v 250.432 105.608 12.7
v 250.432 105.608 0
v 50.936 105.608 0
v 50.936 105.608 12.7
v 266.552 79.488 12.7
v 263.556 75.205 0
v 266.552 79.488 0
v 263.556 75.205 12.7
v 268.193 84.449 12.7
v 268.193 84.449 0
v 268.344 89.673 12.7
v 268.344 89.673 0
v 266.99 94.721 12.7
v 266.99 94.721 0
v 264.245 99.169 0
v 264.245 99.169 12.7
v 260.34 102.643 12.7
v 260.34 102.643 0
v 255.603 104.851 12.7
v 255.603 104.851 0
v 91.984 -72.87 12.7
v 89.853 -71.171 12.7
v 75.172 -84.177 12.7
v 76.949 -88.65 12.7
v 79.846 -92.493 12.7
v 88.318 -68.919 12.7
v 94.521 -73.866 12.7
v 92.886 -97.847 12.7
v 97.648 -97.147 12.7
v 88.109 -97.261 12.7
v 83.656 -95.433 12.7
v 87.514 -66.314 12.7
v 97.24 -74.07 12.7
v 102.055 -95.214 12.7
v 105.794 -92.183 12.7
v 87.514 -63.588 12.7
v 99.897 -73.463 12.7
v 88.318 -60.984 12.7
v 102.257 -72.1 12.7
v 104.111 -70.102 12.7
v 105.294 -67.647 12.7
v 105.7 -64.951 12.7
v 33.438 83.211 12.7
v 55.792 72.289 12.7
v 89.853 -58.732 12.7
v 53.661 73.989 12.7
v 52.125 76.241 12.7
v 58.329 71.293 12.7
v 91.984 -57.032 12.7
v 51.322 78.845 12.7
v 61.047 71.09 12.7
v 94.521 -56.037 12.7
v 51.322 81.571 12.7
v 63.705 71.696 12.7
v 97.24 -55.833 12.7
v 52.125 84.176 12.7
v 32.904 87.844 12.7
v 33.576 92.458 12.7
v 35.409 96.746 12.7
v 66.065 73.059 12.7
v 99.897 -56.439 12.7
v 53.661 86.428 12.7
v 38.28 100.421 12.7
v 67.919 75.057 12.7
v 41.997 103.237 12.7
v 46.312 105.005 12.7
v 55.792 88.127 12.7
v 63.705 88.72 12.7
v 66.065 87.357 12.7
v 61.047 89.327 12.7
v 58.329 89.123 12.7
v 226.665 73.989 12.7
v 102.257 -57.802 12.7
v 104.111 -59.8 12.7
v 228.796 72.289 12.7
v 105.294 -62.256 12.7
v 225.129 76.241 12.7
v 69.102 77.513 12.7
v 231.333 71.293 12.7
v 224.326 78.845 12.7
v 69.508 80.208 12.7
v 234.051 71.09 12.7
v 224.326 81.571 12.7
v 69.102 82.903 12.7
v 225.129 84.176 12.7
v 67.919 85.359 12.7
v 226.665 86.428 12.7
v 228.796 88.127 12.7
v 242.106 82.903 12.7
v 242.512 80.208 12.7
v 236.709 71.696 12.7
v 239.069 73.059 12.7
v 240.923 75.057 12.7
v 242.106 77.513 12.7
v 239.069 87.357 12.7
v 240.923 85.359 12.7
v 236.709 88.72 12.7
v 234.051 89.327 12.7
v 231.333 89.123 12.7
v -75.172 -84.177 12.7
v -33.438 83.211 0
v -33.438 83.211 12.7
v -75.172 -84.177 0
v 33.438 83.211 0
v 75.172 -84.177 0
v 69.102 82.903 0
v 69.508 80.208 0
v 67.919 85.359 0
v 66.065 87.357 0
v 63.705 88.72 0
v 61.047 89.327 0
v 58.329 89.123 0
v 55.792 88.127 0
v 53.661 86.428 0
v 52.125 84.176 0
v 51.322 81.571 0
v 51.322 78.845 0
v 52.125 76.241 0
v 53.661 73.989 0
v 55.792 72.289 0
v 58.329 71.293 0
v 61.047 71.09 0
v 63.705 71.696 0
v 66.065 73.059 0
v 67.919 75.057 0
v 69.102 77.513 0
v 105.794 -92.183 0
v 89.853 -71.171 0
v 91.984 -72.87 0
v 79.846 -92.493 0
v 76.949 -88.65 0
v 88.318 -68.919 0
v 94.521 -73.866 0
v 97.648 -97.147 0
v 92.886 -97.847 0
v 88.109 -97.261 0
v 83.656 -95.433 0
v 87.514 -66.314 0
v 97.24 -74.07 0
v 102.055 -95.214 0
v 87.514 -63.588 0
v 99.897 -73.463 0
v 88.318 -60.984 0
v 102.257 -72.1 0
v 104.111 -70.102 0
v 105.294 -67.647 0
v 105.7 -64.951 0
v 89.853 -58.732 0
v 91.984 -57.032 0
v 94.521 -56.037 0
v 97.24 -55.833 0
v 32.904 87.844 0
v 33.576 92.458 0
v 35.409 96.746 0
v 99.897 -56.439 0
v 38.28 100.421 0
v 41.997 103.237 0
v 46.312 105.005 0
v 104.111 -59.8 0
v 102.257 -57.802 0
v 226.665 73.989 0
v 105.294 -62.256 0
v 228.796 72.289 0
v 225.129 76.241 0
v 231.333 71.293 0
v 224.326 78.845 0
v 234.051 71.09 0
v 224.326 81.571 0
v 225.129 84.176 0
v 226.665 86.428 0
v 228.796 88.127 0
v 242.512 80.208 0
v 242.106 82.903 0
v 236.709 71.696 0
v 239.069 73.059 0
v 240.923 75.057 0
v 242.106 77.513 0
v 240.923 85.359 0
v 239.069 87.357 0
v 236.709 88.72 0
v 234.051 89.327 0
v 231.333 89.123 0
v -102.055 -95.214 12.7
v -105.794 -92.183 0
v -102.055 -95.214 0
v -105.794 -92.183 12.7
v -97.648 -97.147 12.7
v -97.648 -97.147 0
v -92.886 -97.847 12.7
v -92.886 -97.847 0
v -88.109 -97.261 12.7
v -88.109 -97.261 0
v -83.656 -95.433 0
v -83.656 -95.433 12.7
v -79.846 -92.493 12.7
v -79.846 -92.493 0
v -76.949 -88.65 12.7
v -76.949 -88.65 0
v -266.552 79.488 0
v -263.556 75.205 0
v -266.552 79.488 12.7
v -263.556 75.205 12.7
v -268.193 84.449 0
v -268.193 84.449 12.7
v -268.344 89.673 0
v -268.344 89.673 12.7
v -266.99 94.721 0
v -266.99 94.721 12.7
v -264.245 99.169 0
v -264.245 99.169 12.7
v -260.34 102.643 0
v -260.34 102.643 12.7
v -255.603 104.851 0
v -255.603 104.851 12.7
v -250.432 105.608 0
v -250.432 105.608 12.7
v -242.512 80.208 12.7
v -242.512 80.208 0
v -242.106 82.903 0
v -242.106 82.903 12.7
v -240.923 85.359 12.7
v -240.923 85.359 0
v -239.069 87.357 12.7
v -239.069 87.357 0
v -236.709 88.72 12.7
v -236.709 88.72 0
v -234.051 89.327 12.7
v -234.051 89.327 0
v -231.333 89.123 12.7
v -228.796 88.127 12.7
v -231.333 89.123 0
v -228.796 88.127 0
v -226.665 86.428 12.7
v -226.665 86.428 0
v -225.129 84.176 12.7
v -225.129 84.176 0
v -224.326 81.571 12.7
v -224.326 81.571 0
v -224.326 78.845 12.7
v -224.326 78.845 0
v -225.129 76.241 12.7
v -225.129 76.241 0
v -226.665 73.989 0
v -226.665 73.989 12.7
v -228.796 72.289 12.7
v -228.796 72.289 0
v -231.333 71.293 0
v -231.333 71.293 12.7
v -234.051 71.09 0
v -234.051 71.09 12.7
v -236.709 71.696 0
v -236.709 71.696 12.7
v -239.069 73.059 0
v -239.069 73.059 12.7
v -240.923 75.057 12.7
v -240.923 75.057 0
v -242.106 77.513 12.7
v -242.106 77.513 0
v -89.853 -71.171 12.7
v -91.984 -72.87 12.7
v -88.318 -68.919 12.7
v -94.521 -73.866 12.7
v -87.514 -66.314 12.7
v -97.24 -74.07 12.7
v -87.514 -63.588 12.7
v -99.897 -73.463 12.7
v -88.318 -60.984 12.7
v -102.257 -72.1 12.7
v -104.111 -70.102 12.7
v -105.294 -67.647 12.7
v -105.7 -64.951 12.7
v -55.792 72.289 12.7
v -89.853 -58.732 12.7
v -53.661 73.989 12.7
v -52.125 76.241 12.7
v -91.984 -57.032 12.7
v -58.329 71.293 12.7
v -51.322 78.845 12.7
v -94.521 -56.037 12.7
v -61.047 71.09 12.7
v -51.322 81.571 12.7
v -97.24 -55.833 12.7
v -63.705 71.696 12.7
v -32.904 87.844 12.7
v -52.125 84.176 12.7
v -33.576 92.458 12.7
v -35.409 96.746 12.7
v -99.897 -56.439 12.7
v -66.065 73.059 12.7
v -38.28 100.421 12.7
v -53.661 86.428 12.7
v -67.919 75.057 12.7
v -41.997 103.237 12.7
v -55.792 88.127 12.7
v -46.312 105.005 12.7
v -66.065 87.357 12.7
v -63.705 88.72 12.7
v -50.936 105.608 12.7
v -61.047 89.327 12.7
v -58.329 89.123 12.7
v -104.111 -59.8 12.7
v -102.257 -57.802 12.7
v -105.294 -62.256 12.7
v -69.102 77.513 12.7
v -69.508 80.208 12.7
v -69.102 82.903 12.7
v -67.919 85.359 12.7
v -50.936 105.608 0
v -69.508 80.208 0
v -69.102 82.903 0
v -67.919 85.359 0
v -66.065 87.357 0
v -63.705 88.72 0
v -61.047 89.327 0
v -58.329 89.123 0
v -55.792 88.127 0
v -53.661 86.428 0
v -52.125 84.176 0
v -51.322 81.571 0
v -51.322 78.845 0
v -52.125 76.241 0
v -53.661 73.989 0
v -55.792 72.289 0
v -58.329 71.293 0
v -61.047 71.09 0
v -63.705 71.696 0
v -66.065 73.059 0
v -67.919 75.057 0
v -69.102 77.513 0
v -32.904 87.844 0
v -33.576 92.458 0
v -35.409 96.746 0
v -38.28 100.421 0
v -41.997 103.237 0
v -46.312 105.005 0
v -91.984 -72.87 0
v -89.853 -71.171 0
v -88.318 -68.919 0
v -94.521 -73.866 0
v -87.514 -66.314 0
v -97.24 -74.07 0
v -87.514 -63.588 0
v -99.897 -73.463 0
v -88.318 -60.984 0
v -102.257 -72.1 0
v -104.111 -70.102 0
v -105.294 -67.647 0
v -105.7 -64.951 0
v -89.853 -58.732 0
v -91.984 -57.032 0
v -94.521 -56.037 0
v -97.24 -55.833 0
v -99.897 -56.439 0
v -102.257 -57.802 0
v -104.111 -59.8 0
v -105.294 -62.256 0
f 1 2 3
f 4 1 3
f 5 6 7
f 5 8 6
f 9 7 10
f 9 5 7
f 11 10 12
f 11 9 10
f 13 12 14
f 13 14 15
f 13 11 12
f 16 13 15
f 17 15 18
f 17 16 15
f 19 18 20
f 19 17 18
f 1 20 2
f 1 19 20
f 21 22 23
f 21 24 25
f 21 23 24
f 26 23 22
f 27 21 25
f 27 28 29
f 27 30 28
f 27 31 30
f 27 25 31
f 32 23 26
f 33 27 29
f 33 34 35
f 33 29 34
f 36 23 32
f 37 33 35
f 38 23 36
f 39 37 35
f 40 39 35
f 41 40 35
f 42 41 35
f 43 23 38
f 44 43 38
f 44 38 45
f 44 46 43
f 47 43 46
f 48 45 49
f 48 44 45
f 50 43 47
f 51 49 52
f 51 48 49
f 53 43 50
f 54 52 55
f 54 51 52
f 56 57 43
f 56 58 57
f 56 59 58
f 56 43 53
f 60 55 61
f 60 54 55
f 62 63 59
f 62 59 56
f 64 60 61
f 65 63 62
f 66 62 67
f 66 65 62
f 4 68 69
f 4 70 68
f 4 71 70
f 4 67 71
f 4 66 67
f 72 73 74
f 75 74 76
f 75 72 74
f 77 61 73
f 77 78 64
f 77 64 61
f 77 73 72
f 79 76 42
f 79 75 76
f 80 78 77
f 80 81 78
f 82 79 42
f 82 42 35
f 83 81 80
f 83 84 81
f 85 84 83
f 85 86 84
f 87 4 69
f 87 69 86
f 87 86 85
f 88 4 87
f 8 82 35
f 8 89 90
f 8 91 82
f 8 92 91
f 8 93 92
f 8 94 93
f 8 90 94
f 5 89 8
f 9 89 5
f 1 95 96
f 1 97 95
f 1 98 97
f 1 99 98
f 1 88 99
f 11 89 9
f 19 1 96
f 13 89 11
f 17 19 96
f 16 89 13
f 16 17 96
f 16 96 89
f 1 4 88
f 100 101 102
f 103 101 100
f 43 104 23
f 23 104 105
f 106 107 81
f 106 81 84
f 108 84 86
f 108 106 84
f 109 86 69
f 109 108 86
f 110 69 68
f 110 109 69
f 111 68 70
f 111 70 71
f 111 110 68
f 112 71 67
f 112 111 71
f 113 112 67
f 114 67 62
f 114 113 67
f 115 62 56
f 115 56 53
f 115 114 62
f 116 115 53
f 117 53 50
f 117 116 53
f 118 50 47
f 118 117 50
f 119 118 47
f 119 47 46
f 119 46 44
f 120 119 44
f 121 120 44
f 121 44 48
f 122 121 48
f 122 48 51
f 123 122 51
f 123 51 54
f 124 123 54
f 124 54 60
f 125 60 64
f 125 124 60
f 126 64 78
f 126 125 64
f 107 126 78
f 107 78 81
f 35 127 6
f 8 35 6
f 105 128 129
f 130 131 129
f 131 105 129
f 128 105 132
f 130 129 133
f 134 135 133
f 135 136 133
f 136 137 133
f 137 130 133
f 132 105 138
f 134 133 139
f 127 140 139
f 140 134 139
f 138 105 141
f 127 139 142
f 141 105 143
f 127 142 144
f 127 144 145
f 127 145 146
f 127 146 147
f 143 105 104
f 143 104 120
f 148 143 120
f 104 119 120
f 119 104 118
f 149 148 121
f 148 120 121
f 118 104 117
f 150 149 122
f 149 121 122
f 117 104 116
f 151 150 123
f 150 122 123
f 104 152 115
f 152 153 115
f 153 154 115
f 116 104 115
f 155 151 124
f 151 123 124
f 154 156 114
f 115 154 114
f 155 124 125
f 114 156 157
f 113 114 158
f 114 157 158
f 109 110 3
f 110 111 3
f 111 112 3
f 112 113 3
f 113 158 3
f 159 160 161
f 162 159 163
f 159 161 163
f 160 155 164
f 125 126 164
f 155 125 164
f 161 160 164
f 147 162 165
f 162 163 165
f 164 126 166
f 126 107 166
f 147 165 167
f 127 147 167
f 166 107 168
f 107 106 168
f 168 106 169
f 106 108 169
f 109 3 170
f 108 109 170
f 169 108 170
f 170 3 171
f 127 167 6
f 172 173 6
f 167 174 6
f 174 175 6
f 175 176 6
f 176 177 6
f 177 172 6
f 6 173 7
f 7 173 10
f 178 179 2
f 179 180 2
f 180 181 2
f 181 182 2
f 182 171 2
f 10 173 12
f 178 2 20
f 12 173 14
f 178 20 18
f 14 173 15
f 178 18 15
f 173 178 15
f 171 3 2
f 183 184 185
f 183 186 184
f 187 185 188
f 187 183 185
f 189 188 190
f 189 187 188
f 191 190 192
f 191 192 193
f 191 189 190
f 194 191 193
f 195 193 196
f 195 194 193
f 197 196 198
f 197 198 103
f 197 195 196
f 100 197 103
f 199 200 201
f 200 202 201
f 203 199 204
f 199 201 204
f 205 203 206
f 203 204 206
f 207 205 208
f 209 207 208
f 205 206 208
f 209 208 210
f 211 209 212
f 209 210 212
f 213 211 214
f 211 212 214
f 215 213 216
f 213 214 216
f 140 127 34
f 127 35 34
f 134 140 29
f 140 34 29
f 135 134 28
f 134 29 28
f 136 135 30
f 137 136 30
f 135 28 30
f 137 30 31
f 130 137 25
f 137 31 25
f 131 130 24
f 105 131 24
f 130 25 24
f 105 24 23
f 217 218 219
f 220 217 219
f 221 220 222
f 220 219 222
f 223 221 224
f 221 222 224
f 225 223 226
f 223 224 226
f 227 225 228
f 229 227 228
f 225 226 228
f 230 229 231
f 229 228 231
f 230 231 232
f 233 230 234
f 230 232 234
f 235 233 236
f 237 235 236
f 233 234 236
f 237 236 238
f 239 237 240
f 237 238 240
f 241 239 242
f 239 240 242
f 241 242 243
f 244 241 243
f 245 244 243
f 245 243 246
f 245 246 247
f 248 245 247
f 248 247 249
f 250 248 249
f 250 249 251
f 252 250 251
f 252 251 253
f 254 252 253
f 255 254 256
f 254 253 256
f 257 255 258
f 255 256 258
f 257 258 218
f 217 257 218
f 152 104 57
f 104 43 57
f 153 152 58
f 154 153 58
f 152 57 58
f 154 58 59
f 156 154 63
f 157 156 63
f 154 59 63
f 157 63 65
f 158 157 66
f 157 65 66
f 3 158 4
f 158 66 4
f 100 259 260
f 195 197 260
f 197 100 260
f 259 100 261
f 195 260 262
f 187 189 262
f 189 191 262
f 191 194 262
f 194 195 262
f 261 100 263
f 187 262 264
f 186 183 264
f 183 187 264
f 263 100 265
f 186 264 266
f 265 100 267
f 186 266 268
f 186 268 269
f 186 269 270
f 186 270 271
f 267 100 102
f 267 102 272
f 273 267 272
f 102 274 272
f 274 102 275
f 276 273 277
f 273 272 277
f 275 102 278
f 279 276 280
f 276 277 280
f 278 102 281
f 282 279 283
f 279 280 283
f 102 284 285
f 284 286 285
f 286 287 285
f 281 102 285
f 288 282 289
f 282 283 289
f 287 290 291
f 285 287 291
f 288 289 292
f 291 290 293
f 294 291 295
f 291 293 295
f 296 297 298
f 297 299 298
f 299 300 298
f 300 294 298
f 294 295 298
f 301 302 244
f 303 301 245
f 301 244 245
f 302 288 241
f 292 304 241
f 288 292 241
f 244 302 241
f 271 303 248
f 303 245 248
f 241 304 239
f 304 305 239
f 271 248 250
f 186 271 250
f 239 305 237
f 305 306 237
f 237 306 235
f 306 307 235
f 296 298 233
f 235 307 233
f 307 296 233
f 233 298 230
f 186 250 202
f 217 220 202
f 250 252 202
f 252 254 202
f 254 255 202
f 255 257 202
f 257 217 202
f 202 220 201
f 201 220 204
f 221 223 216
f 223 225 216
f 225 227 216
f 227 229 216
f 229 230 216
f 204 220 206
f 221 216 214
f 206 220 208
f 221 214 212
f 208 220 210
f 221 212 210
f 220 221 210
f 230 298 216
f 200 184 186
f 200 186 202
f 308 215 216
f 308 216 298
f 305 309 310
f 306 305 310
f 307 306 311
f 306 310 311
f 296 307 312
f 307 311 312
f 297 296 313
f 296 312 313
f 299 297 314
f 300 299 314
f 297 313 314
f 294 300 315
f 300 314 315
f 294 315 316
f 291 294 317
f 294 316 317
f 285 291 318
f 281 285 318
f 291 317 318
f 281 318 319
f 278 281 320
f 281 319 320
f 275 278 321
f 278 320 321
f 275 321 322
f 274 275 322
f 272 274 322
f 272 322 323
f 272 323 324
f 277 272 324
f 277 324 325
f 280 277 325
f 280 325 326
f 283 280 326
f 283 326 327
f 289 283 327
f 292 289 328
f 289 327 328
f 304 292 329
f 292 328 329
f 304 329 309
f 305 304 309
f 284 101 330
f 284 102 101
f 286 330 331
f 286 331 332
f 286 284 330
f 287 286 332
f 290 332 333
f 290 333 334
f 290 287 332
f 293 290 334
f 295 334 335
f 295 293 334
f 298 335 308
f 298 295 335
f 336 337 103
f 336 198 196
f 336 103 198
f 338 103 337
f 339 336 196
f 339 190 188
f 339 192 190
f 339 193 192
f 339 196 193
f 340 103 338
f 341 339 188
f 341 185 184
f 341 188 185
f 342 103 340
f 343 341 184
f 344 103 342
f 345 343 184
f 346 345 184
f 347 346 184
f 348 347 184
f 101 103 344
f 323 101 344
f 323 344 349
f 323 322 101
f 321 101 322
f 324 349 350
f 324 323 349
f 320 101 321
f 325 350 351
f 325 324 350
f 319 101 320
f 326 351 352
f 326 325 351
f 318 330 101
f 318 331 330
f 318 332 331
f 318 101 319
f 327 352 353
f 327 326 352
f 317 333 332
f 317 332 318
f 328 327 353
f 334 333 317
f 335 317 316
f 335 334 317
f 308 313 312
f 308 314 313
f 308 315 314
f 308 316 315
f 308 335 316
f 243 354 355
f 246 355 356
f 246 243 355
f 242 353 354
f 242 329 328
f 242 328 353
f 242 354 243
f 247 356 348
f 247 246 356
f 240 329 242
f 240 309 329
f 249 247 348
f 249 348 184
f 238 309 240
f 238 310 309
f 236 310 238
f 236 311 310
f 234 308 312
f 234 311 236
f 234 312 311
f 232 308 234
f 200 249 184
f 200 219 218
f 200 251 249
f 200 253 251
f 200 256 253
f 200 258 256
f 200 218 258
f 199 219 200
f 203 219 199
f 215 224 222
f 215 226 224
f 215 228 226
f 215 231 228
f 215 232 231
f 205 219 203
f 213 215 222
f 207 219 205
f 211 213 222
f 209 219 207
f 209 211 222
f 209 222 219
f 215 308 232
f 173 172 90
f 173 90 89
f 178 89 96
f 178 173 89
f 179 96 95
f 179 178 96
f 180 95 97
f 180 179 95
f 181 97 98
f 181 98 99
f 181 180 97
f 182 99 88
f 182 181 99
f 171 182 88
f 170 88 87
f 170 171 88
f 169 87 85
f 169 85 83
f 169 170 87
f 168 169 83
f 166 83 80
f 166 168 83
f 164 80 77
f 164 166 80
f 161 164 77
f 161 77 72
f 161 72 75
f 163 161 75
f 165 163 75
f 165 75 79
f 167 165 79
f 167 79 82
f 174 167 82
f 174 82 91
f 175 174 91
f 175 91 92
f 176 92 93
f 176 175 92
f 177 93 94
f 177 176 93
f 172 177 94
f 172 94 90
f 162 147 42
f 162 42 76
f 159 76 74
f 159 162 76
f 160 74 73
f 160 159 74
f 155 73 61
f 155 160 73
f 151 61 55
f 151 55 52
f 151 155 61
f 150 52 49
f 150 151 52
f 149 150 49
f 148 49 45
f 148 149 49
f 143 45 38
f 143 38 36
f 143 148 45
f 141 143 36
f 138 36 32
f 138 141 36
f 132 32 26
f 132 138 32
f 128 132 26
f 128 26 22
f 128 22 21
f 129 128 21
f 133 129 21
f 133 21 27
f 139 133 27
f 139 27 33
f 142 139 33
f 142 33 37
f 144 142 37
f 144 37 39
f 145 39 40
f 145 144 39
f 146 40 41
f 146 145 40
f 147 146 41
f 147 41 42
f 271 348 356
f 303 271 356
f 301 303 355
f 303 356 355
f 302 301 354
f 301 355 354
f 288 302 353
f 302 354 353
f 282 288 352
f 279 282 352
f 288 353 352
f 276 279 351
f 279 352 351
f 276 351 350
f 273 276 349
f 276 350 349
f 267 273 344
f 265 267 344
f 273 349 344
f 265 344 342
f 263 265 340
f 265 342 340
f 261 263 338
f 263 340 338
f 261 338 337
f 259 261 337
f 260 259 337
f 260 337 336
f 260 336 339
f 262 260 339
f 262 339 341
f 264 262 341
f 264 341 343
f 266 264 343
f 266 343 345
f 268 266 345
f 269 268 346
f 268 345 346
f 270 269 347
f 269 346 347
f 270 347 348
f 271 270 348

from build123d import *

# Parameters (mm, degrees)
F0_R     = 9.144
F1_DEPTH = 12.7
F2_R     = 18.034


with BuildPart() as f1:
    # F0 (on Top) → F1 (new body)
    with BuildSketch(Plane.XY):
        Polygon((83.156722, -116.20149), (292.210639, 105.608113), (27.853377, 105.608113), align=None)
        with Locations((96.556201, -64.9513)):
            Circle(F0_R, mode=Mode.SUBTRACT)
        with Locations((60.363894, 80.208113)):
            Circle(F0_R, mode=Mode.SUBTRACT)
        with Locations((233.367877, 80.208113)):
            Circle(F0_R, mode=Mode.SUBTRACT)
    extrude(amount=F1_DEPTH)

    # F2
    f2_edges = [f1.edges().sort_by_distance(p)[0] for p in [
        (83.156722, -116.20149, 6.35),
        (292.210639, 105.608113, 6.35),
        (27.853377, 105.608113, 6.35),
    ]]
    fillet(f2_edges, radius=F2_R)


with BuildPart() as f3_1:
    # F3: instance of F1
    add(f1.part.mirror(Plane.YZ))


solid = Compound([f1.part, f3_1.part])
